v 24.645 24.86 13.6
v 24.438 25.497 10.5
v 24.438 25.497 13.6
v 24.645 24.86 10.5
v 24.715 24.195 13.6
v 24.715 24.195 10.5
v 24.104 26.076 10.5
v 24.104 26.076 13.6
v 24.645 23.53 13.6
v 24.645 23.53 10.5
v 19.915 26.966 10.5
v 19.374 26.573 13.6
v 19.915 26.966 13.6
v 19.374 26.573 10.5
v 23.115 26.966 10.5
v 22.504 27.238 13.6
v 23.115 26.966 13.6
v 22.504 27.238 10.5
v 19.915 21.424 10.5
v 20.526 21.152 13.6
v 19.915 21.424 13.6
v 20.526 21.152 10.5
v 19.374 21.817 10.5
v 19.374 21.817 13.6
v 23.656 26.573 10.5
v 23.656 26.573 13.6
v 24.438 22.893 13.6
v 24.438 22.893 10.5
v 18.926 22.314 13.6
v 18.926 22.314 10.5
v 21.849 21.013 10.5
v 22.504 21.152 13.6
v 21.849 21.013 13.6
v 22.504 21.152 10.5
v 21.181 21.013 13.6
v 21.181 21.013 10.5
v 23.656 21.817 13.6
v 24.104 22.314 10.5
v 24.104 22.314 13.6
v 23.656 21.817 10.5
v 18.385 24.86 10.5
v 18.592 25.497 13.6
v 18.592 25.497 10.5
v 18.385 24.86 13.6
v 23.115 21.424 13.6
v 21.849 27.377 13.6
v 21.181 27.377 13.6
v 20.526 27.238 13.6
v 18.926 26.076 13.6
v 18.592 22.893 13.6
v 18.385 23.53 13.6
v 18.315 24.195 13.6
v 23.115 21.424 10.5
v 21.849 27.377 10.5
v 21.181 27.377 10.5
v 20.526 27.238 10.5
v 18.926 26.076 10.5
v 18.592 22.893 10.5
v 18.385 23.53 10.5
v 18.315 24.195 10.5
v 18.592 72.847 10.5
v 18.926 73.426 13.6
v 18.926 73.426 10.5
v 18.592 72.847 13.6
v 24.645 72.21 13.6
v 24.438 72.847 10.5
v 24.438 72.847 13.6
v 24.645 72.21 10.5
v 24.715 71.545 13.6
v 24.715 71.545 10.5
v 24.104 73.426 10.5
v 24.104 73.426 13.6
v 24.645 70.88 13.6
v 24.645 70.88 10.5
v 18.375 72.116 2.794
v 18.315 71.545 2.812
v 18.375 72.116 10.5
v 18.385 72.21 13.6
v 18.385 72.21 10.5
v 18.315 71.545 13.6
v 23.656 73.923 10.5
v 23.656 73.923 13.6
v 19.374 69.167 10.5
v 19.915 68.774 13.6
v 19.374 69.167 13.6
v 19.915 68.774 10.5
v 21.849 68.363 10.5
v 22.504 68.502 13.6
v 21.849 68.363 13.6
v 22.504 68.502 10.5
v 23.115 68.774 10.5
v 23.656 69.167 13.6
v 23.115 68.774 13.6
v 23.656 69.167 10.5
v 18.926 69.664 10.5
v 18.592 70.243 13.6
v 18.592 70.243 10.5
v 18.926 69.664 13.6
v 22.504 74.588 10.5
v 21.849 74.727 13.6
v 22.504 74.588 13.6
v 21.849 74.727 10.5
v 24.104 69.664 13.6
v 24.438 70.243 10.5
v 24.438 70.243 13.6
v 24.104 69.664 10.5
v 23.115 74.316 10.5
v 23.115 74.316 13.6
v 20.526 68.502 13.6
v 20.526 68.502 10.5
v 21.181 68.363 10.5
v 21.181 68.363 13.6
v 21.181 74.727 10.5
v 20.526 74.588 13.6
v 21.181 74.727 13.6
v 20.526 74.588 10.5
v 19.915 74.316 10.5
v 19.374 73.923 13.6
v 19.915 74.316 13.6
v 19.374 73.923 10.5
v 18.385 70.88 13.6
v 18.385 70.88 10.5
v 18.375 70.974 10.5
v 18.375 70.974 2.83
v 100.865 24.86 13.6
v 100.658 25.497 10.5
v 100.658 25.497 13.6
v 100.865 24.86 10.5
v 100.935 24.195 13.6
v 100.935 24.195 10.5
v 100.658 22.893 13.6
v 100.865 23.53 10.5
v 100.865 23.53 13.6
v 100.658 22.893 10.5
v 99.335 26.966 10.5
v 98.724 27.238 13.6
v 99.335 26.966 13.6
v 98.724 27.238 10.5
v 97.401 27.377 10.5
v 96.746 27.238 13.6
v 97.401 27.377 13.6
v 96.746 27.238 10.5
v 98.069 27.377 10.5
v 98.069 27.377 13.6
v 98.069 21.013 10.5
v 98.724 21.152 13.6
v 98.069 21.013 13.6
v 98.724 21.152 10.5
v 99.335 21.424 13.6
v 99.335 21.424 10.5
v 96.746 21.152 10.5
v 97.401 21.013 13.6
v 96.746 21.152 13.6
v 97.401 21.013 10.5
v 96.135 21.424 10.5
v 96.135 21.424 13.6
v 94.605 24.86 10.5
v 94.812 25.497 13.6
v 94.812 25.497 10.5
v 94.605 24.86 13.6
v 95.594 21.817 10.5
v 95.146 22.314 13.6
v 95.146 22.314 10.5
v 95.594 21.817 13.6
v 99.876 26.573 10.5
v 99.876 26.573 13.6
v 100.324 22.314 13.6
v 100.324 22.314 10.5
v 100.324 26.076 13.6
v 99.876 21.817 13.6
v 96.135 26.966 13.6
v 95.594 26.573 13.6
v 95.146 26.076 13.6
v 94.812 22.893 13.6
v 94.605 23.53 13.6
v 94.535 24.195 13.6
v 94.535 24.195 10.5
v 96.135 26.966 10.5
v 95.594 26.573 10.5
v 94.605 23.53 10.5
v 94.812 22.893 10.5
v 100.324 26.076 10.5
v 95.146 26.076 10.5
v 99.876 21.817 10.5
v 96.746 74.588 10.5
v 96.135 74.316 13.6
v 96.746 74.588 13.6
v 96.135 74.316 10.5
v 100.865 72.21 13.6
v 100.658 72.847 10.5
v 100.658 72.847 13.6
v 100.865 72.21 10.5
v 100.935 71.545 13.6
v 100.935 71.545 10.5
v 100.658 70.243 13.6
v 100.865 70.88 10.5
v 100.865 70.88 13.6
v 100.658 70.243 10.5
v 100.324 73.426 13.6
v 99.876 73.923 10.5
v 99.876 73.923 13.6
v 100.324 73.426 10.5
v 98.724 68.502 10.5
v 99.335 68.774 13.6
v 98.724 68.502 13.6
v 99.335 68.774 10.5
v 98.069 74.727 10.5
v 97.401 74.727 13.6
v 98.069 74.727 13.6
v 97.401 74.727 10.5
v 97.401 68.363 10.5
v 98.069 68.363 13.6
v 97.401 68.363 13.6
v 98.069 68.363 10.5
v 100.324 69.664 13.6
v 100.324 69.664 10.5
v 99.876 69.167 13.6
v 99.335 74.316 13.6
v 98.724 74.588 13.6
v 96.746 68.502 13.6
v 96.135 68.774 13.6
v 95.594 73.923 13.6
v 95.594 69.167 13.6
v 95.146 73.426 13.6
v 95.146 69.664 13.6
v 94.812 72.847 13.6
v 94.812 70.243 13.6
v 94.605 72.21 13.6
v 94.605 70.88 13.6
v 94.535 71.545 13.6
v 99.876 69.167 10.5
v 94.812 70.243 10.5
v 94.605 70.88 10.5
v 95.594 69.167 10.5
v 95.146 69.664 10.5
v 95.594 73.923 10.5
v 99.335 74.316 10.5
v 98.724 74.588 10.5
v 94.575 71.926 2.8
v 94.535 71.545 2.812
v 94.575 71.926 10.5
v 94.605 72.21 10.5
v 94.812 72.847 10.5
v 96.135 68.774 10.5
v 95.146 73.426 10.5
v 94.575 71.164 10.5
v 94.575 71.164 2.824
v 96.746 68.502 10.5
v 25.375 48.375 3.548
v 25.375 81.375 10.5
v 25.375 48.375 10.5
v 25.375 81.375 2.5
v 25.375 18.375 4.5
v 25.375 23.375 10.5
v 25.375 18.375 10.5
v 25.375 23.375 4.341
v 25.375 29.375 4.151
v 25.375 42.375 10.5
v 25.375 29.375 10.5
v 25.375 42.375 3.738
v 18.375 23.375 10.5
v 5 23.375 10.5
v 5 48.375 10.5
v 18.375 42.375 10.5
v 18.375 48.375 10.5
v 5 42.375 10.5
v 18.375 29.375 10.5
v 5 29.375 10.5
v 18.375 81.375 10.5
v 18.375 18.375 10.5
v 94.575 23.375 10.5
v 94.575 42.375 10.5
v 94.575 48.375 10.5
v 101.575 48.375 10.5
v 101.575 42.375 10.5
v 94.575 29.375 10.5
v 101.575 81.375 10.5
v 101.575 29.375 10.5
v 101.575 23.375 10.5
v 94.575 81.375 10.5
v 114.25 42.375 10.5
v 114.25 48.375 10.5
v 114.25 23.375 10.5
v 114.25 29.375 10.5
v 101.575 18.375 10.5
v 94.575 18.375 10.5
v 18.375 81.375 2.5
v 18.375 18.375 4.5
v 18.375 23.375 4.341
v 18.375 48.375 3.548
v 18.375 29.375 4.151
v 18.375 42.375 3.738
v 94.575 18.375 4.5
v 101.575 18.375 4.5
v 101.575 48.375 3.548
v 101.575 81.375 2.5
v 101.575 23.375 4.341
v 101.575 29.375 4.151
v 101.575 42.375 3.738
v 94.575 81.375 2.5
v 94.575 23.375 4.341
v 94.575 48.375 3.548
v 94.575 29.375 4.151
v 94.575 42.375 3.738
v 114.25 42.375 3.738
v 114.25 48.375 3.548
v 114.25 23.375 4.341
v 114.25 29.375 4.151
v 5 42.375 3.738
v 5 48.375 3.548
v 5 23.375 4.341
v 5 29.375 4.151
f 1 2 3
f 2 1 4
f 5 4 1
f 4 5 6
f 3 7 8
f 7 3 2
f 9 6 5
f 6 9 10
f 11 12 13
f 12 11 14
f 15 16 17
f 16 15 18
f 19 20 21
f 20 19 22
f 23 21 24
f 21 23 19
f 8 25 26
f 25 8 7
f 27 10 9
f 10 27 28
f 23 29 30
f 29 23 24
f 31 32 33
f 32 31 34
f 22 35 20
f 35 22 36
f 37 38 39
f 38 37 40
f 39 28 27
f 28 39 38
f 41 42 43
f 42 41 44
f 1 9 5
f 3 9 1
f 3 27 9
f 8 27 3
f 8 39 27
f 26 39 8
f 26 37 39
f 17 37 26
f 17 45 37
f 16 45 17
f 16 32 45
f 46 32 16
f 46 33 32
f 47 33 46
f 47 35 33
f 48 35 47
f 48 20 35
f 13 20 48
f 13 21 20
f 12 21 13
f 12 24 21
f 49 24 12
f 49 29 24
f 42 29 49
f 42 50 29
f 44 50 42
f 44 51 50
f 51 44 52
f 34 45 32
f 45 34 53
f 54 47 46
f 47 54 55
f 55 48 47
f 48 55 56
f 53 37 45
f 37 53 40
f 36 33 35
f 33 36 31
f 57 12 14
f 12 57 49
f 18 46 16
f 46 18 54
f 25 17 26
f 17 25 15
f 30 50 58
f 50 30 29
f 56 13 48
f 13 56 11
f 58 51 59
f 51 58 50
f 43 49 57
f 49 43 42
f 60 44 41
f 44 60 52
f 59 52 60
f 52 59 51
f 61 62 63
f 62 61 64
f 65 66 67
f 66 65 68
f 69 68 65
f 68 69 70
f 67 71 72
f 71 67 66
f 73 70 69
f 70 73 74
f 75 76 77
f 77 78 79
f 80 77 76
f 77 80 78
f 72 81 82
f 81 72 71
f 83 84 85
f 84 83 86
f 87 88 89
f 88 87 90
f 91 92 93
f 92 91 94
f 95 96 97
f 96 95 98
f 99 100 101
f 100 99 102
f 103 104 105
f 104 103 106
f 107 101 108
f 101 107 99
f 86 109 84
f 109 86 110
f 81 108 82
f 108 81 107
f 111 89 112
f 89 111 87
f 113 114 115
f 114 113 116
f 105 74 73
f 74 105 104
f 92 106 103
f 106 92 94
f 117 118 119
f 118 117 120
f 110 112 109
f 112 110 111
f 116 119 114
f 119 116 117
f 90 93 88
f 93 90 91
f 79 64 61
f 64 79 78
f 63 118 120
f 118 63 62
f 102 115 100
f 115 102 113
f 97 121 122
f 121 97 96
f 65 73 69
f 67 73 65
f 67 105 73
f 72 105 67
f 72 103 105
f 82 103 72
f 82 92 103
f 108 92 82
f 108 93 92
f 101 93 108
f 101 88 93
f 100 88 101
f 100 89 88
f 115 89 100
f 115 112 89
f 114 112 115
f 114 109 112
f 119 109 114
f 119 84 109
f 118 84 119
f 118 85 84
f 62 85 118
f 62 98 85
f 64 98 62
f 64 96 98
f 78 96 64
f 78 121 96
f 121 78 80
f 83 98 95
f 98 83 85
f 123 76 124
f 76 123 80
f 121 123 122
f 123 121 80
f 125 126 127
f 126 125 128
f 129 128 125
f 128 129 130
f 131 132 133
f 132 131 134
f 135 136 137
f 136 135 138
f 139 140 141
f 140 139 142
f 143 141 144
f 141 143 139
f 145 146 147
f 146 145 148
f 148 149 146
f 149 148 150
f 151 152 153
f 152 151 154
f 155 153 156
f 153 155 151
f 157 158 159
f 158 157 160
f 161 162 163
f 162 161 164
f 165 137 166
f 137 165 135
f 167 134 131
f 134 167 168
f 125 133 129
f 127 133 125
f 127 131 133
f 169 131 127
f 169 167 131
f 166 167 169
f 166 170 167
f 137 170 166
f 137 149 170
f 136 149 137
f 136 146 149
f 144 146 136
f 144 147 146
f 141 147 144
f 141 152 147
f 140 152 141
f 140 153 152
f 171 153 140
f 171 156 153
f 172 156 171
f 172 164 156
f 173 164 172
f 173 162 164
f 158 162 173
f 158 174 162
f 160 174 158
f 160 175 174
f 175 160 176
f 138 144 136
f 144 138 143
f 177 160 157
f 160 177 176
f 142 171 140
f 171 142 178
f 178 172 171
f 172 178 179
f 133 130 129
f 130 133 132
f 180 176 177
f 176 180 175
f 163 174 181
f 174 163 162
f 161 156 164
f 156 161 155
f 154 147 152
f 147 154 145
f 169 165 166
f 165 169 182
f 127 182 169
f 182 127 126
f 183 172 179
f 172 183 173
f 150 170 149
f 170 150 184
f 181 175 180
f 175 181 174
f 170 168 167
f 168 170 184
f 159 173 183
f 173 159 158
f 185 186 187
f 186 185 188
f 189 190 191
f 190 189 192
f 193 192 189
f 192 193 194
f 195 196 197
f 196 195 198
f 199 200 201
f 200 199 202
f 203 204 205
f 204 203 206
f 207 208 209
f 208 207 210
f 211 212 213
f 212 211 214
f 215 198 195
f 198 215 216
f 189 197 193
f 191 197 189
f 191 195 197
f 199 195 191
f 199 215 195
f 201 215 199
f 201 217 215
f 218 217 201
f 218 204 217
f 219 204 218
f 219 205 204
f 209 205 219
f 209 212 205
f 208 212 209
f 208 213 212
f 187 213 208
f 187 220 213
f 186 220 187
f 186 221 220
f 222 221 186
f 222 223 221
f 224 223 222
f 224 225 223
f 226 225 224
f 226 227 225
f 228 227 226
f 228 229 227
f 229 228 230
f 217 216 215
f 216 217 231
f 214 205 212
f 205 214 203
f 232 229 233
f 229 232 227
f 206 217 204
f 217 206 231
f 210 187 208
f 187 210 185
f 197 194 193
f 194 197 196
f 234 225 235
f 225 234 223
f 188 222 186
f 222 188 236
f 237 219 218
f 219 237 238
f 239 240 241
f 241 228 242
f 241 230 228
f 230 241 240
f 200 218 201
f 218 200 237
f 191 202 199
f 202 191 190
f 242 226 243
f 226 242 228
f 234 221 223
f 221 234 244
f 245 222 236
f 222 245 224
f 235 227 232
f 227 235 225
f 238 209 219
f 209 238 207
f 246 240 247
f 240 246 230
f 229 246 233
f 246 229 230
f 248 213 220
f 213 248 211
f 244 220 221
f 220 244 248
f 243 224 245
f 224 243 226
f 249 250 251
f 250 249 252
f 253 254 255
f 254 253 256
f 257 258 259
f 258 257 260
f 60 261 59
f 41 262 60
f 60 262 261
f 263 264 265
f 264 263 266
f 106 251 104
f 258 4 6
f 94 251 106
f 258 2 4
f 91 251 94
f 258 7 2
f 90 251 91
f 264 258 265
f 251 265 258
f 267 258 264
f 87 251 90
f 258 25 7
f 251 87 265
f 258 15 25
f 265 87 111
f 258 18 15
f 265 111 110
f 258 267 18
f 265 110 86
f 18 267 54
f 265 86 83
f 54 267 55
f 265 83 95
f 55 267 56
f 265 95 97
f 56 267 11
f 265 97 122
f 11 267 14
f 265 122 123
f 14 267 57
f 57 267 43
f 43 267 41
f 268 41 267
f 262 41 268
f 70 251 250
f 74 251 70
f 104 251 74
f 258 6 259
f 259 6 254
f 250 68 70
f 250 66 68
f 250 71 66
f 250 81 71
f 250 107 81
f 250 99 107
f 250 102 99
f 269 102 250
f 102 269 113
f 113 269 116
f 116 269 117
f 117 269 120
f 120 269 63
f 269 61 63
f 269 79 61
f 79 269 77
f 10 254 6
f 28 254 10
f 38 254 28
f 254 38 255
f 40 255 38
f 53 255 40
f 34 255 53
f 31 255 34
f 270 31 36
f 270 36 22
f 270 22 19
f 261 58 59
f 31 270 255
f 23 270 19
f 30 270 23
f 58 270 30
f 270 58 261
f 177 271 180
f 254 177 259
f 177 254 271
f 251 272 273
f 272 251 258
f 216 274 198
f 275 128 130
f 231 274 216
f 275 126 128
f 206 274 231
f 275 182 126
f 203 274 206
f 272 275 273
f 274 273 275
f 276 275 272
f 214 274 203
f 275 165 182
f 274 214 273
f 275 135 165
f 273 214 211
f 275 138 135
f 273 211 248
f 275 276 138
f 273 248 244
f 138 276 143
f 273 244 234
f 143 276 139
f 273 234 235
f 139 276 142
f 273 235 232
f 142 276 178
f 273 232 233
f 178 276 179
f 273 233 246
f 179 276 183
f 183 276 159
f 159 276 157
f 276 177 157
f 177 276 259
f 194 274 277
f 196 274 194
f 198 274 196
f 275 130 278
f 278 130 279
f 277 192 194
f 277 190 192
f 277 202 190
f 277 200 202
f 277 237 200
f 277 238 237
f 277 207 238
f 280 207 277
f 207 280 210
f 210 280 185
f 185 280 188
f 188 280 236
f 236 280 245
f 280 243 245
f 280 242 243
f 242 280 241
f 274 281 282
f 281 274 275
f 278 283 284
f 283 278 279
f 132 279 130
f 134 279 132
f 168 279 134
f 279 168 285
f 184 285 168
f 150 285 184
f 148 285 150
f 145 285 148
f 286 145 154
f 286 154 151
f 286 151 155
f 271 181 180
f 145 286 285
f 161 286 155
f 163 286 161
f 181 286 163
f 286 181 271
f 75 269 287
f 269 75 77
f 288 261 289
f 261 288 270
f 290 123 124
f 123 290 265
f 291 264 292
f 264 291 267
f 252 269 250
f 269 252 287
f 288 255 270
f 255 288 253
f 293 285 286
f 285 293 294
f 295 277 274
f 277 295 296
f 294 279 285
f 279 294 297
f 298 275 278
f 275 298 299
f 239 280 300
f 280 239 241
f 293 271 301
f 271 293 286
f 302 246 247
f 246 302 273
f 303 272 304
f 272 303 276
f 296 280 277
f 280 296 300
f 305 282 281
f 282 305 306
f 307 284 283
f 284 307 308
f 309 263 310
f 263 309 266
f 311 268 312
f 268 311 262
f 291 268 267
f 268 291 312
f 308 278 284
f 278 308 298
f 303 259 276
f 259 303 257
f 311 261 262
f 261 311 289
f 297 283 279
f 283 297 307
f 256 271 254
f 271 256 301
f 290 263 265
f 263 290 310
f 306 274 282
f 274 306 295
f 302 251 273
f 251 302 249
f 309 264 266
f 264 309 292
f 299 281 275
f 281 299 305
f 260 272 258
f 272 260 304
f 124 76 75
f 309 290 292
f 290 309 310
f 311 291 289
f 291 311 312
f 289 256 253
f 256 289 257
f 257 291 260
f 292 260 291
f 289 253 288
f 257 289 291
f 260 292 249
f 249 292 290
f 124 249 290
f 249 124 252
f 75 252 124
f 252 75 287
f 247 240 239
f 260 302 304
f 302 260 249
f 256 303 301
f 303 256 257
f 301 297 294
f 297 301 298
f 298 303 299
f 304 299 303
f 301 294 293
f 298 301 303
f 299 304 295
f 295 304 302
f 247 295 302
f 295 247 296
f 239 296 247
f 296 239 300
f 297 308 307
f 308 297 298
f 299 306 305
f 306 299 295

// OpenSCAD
// pcb dimensions
pcb_width     = 110.5;
pcb_height    =  91.5;
pcb_depth     =   1.6;
pcb_margin    =   0.625;

// layer dimensions
layer_depth   =   2.5;
border_width  =   5.0;
layers        =   3.0;

hole_radius    =  6.4/2;
post_extra     =  1.5;
back_extra     =  2;
vpillar_width  =  7.0;
vpillar_height = 63;
hpillar_width  = pcb_width - pcb_margin * 2;
hpillar_height =  6;

// elevations
pillar_depth   = 6;
pcb_elevation  = pillar_depth + layer_depth + back_extra;

plate    = false;
pcb      = false;

$fs = 0.5;

module screw_holes(depth, radius, elevation) {
    translate([border_width - pcb_margin + 17.14, border_width - pcb_margin + 19.82, elevation])
        cylinder(h=depth, r=radius);
    translate([border_width - pcb_margin + 17.14, border_width - pcb_margin + pcb_height - 24.33, elevation])
        cylinder(h=depth, r=radius);
    translate([border_width - pcb_margin + pcb_width - 17.14, border_width - pcb_margin + 19.82, elevation])
        cylinder(h=depth, r=radius);
    translate([border_width - pcb_margin + pcb_width - 17.14, border_width - pcb_margin + pcb_height - 24.33, elevation])
        cylinder(h=depth, r=radius);
}

module pcb() {
    difference() {
        // pcb
        translate([border_width - pcb_margin, border_width - pcb_margin, pcb_elevation])
            color("green")
            cube([pcb_width, pcb_height, pcb_depth]);
        
        // holes
        screw_holes(pcb_depth, hole_radius, pcb_elevation);
    }
}

module base_plate() {
    difference() {
        color("silver")
            cube([pcb_width + (border_width - pcb_margin) * 2, pcb_height + (border_width - pcb_margin) * 2, layer_depth]);
        
        screw_holes(layer_depth, 2, 0);
    }
}


// build keyboard
//difference() {

module mount() {
    screw_holes(back_extra + pillar_depth + pcb_depth + post_extra, hole_radius, layer_depth);

    translate([border_width - pcb_margin + 14, 
        border_width - pcb_margin + 14, layer_depth])
        cube([vpillar_width, vpillar_height, pillar_depth + back_extra]);

    translate([border_width - pcb_margin + 90.2, 
        border_width - pcb_margin + 14, layer_depth])
        cube([vpillar_width, vpillar_height, pillar_depth + back_extra]);

    translate([border_width, 
        border_width - pcb_margin + 19, layer_depth])
        cube([hpillar_width, hpillar_height, pillar_depth + back_extra]);

    translate([border_width, 
        border_width - pcb_margin + 38, layer_depth])
        cube([hpillar_width, hpillar_height, pillar_depth + back_extra]);
}

module wedge() {
    translate([hpillar_width + border_width, vpillar_height + border_width - pcb_margin + 14, layer_depth])
    rotate([0, 0, 180])
    polyhedron(
           points=[[0,0,0], [hpillar_width,0,0], [hpillar_width,vpillar_height,0], [0,vpillar_height,0], [0,vpillar_height, back_extra], [hpillar_width,vpillar_height, back_extra]],
           faces=[[0,1,2,3],[5,4,3,2],[0,4,5,1],[0,3,4],[5,2,1]]
    );
}

difference() {
    mount();
    wedge();
}


if (plate) {
    base_plate();
}
if (pcb) {
    pcb();
}
